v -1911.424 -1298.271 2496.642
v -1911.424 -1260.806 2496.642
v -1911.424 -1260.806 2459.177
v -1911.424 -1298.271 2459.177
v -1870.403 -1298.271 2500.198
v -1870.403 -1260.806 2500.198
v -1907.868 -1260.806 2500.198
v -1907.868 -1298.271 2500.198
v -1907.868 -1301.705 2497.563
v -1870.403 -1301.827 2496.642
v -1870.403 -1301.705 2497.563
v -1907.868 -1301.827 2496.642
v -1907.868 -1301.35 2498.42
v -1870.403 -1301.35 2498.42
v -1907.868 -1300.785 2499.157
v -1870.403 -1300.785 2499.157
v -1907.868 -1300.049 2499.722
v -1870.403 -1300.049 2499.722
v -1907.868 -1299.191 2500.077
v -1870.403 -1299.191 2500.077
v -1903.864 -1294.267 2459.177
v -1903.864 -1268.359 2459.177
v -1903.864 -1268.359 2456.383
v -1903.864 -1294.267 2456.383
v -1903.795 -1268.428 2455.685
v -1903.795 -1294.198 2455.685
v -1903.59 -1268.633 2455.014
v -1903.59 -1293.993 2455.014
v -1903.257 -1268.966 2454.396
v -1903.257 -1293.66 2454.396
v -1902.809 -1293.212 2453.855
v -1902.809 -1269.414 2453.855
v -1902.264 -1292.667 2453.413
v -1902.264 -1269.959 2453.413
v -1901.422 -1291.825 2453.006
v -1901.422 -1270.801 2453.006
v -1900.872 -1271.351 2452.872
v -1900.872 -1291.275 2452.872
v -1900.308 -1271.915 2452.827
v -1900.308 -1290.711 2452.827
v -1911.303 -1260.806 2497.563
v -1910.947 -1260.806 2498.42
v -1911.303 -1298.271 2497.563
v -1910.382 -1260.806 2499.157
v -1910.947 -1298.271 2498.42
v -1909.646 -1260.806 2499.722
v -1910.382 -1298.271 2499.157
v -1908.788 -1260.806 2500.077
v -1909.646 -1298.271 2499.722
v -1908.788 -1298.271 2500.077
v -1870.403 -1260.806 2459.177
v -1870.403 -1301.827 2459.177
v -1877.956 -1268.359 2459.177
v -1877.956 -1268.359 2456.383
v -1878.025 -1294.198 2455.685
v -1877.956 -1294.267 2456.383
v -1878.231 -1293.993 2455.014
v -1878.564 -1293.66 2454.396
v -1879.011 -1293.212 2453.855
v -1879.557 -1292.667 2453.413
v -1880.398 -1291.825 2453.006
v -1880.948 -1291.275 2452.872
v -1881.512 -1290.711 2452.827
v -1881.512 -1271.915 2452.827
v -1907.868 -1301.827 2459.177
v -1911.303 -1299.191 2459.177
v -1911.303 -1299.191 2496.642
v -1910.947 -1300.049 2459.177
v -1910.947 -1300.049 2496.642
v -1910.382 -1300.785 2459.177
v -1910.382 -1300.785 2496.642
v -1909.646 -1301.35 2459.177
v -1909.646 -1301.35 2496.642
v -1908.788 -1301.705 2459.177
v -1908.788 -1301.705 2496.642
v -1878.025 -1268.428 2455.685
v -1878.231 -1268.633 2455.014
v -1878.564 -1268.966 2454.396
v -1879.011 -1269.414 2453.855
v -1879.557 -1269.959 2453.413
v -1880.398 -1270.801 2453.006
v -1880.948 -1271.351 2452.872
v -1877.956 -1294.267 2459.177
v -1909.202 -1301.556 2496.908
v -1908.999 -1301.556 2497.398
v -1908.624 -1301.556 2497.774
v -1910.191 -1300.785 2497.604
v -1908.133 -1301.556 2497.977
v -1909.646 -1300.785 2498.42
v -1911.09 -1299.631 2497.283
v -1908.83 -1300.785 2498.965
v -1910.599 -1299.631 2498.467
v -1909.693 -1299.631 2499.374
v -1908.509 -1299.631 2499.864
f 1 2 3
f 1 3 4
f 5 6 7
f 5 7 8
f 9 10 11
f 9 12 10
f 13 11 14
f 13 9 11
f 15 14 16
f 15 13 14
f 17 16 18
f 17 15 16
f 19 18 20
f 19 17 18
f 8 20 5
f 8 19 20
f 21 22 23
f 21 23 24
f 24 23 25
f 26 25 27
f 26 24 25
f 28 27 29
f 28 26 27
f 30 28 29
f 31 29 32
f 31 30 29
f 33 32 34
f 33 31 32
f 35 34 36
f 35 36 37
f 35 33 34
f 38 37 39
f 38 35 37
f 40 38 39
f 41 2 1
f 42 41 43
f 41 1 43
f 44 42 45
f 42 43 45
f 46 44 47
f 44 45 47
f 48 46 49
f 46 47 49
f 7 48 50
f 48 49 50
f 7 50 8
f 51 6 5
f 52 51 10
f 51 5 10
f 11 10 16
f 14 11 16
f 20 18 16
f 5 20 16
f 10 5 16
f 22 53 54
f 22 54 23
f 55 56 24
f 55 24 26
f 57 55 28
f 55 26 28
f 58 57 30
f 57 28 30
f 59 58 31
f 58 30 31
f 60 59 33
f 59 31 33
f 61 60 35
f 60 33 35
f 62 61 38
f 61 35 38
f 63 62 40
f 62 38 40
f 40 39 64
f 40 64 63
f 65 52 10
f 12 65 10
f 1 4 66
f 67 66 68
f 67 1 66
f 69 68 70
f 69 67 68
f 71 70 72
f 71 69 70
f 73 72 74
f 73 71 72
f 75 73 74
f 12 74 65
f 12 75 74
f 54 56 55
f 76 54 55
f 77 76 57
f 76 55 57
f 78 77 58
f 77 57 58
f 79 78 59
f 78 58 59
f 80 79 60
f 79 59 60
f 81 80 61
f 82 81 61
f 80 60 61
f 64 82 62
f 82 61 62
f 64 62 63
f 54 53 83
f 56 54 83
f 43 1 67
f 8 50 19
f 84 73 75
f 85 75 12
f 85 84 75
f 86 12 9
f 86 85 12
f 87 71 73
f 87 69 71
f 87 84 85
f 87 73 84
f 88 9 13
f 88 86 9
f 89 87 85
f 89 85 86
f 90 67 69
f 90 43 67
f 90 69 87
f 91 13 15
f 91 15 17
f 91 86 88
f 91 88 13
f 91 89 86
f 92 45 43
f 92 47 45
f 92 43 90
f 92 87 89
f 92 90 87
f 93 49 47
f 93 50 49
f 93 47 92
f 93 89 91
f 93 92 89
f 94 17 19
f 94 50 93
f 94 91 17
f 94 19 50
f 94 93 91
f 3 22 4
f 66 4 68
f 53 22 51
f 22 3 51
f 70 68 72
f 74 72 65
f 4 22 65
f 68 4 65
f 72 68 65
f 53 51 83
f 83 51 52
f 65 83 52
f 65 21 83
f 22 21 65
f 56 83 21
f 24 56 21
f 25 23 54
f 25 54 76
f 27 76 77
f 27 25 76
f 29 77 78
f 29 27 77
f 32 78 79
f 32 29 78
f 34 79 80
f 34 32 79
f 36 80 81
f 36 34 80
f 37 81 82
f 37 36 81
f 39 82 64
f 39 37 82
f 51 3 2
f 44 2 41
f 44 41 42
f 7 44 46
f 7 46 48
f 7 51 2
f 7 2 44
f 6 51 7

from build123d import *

# Parameters (mm, degrees)
SKETCH060_W             = 41.021
SKETCH060_H             = 41.021
PAD050_DEPTH            = 41.021
SKETCH059_W             = 25.908
SKETCH059_H             = 25.908
PAD049_DEPTH            = 6.35
FILLET005_R             = 3.556
FILLET004_R             = 3.556
BODY041_PLACEMENT_ANGLE = 270


with BuildPart() as part:
    # Sketch060 → Pad050 (new body)
    with BuildSketch(Plane.XZ):
        with Locations((20.5105, 20.5105)):
            Rectangle(SKETCH060_W, SKETCH060_H)
    extrude(amount=PAD050_DEPTH)

    # Sketch059 (on Face3 of Pad050) → Pad049 (join)
    with BuildSketch(Plane(origin=(0, 0, 0), x_dir=(1, 0, 0), z_dir=(0, 0, -1))):
        with Locations((20.507403, 20.507403)):
            Rectangle(SKETCH059_W, SKETCH059_H)
    extrude(amount=PAD049_DEPTH)

    # Fillet005
    fillet005_edges = [part.edges().sort_by_distance(p)[0] for p in [
        (7.553403, -20.507403, -6.35),
        (20.507403, -33.461403, -6.35),
        (20.507403, -7.553403, -6.35),
        (33.461403, -20.507403, -6.35),
    ]]
    fillet(fillet005_edges, radius=FILLET005_R)

    # Fillet004
    fillet004_edges = [part.edges().sort_by_distance(p)[0] for p in [
        (20.5105, -41.021, 41.021),
        (41.021, -41.021, 20.5105),
        (41.021, -20.5105, 41.021),
    ]]
    fillet(fillet004_edges, radius=FILLET004_R)


with BuildPart() as part_1:
    # Body041 placement: moved
    add(part.part.moved(Location((-1870.402819, -1260.805597, 2459.1772))).rotate(Axis((-1870.402819, -1260.805597, 2459.1772), (0, 0, 1)), BODY041_PLACEMENT_ANGLE))


solid = part_1.part
